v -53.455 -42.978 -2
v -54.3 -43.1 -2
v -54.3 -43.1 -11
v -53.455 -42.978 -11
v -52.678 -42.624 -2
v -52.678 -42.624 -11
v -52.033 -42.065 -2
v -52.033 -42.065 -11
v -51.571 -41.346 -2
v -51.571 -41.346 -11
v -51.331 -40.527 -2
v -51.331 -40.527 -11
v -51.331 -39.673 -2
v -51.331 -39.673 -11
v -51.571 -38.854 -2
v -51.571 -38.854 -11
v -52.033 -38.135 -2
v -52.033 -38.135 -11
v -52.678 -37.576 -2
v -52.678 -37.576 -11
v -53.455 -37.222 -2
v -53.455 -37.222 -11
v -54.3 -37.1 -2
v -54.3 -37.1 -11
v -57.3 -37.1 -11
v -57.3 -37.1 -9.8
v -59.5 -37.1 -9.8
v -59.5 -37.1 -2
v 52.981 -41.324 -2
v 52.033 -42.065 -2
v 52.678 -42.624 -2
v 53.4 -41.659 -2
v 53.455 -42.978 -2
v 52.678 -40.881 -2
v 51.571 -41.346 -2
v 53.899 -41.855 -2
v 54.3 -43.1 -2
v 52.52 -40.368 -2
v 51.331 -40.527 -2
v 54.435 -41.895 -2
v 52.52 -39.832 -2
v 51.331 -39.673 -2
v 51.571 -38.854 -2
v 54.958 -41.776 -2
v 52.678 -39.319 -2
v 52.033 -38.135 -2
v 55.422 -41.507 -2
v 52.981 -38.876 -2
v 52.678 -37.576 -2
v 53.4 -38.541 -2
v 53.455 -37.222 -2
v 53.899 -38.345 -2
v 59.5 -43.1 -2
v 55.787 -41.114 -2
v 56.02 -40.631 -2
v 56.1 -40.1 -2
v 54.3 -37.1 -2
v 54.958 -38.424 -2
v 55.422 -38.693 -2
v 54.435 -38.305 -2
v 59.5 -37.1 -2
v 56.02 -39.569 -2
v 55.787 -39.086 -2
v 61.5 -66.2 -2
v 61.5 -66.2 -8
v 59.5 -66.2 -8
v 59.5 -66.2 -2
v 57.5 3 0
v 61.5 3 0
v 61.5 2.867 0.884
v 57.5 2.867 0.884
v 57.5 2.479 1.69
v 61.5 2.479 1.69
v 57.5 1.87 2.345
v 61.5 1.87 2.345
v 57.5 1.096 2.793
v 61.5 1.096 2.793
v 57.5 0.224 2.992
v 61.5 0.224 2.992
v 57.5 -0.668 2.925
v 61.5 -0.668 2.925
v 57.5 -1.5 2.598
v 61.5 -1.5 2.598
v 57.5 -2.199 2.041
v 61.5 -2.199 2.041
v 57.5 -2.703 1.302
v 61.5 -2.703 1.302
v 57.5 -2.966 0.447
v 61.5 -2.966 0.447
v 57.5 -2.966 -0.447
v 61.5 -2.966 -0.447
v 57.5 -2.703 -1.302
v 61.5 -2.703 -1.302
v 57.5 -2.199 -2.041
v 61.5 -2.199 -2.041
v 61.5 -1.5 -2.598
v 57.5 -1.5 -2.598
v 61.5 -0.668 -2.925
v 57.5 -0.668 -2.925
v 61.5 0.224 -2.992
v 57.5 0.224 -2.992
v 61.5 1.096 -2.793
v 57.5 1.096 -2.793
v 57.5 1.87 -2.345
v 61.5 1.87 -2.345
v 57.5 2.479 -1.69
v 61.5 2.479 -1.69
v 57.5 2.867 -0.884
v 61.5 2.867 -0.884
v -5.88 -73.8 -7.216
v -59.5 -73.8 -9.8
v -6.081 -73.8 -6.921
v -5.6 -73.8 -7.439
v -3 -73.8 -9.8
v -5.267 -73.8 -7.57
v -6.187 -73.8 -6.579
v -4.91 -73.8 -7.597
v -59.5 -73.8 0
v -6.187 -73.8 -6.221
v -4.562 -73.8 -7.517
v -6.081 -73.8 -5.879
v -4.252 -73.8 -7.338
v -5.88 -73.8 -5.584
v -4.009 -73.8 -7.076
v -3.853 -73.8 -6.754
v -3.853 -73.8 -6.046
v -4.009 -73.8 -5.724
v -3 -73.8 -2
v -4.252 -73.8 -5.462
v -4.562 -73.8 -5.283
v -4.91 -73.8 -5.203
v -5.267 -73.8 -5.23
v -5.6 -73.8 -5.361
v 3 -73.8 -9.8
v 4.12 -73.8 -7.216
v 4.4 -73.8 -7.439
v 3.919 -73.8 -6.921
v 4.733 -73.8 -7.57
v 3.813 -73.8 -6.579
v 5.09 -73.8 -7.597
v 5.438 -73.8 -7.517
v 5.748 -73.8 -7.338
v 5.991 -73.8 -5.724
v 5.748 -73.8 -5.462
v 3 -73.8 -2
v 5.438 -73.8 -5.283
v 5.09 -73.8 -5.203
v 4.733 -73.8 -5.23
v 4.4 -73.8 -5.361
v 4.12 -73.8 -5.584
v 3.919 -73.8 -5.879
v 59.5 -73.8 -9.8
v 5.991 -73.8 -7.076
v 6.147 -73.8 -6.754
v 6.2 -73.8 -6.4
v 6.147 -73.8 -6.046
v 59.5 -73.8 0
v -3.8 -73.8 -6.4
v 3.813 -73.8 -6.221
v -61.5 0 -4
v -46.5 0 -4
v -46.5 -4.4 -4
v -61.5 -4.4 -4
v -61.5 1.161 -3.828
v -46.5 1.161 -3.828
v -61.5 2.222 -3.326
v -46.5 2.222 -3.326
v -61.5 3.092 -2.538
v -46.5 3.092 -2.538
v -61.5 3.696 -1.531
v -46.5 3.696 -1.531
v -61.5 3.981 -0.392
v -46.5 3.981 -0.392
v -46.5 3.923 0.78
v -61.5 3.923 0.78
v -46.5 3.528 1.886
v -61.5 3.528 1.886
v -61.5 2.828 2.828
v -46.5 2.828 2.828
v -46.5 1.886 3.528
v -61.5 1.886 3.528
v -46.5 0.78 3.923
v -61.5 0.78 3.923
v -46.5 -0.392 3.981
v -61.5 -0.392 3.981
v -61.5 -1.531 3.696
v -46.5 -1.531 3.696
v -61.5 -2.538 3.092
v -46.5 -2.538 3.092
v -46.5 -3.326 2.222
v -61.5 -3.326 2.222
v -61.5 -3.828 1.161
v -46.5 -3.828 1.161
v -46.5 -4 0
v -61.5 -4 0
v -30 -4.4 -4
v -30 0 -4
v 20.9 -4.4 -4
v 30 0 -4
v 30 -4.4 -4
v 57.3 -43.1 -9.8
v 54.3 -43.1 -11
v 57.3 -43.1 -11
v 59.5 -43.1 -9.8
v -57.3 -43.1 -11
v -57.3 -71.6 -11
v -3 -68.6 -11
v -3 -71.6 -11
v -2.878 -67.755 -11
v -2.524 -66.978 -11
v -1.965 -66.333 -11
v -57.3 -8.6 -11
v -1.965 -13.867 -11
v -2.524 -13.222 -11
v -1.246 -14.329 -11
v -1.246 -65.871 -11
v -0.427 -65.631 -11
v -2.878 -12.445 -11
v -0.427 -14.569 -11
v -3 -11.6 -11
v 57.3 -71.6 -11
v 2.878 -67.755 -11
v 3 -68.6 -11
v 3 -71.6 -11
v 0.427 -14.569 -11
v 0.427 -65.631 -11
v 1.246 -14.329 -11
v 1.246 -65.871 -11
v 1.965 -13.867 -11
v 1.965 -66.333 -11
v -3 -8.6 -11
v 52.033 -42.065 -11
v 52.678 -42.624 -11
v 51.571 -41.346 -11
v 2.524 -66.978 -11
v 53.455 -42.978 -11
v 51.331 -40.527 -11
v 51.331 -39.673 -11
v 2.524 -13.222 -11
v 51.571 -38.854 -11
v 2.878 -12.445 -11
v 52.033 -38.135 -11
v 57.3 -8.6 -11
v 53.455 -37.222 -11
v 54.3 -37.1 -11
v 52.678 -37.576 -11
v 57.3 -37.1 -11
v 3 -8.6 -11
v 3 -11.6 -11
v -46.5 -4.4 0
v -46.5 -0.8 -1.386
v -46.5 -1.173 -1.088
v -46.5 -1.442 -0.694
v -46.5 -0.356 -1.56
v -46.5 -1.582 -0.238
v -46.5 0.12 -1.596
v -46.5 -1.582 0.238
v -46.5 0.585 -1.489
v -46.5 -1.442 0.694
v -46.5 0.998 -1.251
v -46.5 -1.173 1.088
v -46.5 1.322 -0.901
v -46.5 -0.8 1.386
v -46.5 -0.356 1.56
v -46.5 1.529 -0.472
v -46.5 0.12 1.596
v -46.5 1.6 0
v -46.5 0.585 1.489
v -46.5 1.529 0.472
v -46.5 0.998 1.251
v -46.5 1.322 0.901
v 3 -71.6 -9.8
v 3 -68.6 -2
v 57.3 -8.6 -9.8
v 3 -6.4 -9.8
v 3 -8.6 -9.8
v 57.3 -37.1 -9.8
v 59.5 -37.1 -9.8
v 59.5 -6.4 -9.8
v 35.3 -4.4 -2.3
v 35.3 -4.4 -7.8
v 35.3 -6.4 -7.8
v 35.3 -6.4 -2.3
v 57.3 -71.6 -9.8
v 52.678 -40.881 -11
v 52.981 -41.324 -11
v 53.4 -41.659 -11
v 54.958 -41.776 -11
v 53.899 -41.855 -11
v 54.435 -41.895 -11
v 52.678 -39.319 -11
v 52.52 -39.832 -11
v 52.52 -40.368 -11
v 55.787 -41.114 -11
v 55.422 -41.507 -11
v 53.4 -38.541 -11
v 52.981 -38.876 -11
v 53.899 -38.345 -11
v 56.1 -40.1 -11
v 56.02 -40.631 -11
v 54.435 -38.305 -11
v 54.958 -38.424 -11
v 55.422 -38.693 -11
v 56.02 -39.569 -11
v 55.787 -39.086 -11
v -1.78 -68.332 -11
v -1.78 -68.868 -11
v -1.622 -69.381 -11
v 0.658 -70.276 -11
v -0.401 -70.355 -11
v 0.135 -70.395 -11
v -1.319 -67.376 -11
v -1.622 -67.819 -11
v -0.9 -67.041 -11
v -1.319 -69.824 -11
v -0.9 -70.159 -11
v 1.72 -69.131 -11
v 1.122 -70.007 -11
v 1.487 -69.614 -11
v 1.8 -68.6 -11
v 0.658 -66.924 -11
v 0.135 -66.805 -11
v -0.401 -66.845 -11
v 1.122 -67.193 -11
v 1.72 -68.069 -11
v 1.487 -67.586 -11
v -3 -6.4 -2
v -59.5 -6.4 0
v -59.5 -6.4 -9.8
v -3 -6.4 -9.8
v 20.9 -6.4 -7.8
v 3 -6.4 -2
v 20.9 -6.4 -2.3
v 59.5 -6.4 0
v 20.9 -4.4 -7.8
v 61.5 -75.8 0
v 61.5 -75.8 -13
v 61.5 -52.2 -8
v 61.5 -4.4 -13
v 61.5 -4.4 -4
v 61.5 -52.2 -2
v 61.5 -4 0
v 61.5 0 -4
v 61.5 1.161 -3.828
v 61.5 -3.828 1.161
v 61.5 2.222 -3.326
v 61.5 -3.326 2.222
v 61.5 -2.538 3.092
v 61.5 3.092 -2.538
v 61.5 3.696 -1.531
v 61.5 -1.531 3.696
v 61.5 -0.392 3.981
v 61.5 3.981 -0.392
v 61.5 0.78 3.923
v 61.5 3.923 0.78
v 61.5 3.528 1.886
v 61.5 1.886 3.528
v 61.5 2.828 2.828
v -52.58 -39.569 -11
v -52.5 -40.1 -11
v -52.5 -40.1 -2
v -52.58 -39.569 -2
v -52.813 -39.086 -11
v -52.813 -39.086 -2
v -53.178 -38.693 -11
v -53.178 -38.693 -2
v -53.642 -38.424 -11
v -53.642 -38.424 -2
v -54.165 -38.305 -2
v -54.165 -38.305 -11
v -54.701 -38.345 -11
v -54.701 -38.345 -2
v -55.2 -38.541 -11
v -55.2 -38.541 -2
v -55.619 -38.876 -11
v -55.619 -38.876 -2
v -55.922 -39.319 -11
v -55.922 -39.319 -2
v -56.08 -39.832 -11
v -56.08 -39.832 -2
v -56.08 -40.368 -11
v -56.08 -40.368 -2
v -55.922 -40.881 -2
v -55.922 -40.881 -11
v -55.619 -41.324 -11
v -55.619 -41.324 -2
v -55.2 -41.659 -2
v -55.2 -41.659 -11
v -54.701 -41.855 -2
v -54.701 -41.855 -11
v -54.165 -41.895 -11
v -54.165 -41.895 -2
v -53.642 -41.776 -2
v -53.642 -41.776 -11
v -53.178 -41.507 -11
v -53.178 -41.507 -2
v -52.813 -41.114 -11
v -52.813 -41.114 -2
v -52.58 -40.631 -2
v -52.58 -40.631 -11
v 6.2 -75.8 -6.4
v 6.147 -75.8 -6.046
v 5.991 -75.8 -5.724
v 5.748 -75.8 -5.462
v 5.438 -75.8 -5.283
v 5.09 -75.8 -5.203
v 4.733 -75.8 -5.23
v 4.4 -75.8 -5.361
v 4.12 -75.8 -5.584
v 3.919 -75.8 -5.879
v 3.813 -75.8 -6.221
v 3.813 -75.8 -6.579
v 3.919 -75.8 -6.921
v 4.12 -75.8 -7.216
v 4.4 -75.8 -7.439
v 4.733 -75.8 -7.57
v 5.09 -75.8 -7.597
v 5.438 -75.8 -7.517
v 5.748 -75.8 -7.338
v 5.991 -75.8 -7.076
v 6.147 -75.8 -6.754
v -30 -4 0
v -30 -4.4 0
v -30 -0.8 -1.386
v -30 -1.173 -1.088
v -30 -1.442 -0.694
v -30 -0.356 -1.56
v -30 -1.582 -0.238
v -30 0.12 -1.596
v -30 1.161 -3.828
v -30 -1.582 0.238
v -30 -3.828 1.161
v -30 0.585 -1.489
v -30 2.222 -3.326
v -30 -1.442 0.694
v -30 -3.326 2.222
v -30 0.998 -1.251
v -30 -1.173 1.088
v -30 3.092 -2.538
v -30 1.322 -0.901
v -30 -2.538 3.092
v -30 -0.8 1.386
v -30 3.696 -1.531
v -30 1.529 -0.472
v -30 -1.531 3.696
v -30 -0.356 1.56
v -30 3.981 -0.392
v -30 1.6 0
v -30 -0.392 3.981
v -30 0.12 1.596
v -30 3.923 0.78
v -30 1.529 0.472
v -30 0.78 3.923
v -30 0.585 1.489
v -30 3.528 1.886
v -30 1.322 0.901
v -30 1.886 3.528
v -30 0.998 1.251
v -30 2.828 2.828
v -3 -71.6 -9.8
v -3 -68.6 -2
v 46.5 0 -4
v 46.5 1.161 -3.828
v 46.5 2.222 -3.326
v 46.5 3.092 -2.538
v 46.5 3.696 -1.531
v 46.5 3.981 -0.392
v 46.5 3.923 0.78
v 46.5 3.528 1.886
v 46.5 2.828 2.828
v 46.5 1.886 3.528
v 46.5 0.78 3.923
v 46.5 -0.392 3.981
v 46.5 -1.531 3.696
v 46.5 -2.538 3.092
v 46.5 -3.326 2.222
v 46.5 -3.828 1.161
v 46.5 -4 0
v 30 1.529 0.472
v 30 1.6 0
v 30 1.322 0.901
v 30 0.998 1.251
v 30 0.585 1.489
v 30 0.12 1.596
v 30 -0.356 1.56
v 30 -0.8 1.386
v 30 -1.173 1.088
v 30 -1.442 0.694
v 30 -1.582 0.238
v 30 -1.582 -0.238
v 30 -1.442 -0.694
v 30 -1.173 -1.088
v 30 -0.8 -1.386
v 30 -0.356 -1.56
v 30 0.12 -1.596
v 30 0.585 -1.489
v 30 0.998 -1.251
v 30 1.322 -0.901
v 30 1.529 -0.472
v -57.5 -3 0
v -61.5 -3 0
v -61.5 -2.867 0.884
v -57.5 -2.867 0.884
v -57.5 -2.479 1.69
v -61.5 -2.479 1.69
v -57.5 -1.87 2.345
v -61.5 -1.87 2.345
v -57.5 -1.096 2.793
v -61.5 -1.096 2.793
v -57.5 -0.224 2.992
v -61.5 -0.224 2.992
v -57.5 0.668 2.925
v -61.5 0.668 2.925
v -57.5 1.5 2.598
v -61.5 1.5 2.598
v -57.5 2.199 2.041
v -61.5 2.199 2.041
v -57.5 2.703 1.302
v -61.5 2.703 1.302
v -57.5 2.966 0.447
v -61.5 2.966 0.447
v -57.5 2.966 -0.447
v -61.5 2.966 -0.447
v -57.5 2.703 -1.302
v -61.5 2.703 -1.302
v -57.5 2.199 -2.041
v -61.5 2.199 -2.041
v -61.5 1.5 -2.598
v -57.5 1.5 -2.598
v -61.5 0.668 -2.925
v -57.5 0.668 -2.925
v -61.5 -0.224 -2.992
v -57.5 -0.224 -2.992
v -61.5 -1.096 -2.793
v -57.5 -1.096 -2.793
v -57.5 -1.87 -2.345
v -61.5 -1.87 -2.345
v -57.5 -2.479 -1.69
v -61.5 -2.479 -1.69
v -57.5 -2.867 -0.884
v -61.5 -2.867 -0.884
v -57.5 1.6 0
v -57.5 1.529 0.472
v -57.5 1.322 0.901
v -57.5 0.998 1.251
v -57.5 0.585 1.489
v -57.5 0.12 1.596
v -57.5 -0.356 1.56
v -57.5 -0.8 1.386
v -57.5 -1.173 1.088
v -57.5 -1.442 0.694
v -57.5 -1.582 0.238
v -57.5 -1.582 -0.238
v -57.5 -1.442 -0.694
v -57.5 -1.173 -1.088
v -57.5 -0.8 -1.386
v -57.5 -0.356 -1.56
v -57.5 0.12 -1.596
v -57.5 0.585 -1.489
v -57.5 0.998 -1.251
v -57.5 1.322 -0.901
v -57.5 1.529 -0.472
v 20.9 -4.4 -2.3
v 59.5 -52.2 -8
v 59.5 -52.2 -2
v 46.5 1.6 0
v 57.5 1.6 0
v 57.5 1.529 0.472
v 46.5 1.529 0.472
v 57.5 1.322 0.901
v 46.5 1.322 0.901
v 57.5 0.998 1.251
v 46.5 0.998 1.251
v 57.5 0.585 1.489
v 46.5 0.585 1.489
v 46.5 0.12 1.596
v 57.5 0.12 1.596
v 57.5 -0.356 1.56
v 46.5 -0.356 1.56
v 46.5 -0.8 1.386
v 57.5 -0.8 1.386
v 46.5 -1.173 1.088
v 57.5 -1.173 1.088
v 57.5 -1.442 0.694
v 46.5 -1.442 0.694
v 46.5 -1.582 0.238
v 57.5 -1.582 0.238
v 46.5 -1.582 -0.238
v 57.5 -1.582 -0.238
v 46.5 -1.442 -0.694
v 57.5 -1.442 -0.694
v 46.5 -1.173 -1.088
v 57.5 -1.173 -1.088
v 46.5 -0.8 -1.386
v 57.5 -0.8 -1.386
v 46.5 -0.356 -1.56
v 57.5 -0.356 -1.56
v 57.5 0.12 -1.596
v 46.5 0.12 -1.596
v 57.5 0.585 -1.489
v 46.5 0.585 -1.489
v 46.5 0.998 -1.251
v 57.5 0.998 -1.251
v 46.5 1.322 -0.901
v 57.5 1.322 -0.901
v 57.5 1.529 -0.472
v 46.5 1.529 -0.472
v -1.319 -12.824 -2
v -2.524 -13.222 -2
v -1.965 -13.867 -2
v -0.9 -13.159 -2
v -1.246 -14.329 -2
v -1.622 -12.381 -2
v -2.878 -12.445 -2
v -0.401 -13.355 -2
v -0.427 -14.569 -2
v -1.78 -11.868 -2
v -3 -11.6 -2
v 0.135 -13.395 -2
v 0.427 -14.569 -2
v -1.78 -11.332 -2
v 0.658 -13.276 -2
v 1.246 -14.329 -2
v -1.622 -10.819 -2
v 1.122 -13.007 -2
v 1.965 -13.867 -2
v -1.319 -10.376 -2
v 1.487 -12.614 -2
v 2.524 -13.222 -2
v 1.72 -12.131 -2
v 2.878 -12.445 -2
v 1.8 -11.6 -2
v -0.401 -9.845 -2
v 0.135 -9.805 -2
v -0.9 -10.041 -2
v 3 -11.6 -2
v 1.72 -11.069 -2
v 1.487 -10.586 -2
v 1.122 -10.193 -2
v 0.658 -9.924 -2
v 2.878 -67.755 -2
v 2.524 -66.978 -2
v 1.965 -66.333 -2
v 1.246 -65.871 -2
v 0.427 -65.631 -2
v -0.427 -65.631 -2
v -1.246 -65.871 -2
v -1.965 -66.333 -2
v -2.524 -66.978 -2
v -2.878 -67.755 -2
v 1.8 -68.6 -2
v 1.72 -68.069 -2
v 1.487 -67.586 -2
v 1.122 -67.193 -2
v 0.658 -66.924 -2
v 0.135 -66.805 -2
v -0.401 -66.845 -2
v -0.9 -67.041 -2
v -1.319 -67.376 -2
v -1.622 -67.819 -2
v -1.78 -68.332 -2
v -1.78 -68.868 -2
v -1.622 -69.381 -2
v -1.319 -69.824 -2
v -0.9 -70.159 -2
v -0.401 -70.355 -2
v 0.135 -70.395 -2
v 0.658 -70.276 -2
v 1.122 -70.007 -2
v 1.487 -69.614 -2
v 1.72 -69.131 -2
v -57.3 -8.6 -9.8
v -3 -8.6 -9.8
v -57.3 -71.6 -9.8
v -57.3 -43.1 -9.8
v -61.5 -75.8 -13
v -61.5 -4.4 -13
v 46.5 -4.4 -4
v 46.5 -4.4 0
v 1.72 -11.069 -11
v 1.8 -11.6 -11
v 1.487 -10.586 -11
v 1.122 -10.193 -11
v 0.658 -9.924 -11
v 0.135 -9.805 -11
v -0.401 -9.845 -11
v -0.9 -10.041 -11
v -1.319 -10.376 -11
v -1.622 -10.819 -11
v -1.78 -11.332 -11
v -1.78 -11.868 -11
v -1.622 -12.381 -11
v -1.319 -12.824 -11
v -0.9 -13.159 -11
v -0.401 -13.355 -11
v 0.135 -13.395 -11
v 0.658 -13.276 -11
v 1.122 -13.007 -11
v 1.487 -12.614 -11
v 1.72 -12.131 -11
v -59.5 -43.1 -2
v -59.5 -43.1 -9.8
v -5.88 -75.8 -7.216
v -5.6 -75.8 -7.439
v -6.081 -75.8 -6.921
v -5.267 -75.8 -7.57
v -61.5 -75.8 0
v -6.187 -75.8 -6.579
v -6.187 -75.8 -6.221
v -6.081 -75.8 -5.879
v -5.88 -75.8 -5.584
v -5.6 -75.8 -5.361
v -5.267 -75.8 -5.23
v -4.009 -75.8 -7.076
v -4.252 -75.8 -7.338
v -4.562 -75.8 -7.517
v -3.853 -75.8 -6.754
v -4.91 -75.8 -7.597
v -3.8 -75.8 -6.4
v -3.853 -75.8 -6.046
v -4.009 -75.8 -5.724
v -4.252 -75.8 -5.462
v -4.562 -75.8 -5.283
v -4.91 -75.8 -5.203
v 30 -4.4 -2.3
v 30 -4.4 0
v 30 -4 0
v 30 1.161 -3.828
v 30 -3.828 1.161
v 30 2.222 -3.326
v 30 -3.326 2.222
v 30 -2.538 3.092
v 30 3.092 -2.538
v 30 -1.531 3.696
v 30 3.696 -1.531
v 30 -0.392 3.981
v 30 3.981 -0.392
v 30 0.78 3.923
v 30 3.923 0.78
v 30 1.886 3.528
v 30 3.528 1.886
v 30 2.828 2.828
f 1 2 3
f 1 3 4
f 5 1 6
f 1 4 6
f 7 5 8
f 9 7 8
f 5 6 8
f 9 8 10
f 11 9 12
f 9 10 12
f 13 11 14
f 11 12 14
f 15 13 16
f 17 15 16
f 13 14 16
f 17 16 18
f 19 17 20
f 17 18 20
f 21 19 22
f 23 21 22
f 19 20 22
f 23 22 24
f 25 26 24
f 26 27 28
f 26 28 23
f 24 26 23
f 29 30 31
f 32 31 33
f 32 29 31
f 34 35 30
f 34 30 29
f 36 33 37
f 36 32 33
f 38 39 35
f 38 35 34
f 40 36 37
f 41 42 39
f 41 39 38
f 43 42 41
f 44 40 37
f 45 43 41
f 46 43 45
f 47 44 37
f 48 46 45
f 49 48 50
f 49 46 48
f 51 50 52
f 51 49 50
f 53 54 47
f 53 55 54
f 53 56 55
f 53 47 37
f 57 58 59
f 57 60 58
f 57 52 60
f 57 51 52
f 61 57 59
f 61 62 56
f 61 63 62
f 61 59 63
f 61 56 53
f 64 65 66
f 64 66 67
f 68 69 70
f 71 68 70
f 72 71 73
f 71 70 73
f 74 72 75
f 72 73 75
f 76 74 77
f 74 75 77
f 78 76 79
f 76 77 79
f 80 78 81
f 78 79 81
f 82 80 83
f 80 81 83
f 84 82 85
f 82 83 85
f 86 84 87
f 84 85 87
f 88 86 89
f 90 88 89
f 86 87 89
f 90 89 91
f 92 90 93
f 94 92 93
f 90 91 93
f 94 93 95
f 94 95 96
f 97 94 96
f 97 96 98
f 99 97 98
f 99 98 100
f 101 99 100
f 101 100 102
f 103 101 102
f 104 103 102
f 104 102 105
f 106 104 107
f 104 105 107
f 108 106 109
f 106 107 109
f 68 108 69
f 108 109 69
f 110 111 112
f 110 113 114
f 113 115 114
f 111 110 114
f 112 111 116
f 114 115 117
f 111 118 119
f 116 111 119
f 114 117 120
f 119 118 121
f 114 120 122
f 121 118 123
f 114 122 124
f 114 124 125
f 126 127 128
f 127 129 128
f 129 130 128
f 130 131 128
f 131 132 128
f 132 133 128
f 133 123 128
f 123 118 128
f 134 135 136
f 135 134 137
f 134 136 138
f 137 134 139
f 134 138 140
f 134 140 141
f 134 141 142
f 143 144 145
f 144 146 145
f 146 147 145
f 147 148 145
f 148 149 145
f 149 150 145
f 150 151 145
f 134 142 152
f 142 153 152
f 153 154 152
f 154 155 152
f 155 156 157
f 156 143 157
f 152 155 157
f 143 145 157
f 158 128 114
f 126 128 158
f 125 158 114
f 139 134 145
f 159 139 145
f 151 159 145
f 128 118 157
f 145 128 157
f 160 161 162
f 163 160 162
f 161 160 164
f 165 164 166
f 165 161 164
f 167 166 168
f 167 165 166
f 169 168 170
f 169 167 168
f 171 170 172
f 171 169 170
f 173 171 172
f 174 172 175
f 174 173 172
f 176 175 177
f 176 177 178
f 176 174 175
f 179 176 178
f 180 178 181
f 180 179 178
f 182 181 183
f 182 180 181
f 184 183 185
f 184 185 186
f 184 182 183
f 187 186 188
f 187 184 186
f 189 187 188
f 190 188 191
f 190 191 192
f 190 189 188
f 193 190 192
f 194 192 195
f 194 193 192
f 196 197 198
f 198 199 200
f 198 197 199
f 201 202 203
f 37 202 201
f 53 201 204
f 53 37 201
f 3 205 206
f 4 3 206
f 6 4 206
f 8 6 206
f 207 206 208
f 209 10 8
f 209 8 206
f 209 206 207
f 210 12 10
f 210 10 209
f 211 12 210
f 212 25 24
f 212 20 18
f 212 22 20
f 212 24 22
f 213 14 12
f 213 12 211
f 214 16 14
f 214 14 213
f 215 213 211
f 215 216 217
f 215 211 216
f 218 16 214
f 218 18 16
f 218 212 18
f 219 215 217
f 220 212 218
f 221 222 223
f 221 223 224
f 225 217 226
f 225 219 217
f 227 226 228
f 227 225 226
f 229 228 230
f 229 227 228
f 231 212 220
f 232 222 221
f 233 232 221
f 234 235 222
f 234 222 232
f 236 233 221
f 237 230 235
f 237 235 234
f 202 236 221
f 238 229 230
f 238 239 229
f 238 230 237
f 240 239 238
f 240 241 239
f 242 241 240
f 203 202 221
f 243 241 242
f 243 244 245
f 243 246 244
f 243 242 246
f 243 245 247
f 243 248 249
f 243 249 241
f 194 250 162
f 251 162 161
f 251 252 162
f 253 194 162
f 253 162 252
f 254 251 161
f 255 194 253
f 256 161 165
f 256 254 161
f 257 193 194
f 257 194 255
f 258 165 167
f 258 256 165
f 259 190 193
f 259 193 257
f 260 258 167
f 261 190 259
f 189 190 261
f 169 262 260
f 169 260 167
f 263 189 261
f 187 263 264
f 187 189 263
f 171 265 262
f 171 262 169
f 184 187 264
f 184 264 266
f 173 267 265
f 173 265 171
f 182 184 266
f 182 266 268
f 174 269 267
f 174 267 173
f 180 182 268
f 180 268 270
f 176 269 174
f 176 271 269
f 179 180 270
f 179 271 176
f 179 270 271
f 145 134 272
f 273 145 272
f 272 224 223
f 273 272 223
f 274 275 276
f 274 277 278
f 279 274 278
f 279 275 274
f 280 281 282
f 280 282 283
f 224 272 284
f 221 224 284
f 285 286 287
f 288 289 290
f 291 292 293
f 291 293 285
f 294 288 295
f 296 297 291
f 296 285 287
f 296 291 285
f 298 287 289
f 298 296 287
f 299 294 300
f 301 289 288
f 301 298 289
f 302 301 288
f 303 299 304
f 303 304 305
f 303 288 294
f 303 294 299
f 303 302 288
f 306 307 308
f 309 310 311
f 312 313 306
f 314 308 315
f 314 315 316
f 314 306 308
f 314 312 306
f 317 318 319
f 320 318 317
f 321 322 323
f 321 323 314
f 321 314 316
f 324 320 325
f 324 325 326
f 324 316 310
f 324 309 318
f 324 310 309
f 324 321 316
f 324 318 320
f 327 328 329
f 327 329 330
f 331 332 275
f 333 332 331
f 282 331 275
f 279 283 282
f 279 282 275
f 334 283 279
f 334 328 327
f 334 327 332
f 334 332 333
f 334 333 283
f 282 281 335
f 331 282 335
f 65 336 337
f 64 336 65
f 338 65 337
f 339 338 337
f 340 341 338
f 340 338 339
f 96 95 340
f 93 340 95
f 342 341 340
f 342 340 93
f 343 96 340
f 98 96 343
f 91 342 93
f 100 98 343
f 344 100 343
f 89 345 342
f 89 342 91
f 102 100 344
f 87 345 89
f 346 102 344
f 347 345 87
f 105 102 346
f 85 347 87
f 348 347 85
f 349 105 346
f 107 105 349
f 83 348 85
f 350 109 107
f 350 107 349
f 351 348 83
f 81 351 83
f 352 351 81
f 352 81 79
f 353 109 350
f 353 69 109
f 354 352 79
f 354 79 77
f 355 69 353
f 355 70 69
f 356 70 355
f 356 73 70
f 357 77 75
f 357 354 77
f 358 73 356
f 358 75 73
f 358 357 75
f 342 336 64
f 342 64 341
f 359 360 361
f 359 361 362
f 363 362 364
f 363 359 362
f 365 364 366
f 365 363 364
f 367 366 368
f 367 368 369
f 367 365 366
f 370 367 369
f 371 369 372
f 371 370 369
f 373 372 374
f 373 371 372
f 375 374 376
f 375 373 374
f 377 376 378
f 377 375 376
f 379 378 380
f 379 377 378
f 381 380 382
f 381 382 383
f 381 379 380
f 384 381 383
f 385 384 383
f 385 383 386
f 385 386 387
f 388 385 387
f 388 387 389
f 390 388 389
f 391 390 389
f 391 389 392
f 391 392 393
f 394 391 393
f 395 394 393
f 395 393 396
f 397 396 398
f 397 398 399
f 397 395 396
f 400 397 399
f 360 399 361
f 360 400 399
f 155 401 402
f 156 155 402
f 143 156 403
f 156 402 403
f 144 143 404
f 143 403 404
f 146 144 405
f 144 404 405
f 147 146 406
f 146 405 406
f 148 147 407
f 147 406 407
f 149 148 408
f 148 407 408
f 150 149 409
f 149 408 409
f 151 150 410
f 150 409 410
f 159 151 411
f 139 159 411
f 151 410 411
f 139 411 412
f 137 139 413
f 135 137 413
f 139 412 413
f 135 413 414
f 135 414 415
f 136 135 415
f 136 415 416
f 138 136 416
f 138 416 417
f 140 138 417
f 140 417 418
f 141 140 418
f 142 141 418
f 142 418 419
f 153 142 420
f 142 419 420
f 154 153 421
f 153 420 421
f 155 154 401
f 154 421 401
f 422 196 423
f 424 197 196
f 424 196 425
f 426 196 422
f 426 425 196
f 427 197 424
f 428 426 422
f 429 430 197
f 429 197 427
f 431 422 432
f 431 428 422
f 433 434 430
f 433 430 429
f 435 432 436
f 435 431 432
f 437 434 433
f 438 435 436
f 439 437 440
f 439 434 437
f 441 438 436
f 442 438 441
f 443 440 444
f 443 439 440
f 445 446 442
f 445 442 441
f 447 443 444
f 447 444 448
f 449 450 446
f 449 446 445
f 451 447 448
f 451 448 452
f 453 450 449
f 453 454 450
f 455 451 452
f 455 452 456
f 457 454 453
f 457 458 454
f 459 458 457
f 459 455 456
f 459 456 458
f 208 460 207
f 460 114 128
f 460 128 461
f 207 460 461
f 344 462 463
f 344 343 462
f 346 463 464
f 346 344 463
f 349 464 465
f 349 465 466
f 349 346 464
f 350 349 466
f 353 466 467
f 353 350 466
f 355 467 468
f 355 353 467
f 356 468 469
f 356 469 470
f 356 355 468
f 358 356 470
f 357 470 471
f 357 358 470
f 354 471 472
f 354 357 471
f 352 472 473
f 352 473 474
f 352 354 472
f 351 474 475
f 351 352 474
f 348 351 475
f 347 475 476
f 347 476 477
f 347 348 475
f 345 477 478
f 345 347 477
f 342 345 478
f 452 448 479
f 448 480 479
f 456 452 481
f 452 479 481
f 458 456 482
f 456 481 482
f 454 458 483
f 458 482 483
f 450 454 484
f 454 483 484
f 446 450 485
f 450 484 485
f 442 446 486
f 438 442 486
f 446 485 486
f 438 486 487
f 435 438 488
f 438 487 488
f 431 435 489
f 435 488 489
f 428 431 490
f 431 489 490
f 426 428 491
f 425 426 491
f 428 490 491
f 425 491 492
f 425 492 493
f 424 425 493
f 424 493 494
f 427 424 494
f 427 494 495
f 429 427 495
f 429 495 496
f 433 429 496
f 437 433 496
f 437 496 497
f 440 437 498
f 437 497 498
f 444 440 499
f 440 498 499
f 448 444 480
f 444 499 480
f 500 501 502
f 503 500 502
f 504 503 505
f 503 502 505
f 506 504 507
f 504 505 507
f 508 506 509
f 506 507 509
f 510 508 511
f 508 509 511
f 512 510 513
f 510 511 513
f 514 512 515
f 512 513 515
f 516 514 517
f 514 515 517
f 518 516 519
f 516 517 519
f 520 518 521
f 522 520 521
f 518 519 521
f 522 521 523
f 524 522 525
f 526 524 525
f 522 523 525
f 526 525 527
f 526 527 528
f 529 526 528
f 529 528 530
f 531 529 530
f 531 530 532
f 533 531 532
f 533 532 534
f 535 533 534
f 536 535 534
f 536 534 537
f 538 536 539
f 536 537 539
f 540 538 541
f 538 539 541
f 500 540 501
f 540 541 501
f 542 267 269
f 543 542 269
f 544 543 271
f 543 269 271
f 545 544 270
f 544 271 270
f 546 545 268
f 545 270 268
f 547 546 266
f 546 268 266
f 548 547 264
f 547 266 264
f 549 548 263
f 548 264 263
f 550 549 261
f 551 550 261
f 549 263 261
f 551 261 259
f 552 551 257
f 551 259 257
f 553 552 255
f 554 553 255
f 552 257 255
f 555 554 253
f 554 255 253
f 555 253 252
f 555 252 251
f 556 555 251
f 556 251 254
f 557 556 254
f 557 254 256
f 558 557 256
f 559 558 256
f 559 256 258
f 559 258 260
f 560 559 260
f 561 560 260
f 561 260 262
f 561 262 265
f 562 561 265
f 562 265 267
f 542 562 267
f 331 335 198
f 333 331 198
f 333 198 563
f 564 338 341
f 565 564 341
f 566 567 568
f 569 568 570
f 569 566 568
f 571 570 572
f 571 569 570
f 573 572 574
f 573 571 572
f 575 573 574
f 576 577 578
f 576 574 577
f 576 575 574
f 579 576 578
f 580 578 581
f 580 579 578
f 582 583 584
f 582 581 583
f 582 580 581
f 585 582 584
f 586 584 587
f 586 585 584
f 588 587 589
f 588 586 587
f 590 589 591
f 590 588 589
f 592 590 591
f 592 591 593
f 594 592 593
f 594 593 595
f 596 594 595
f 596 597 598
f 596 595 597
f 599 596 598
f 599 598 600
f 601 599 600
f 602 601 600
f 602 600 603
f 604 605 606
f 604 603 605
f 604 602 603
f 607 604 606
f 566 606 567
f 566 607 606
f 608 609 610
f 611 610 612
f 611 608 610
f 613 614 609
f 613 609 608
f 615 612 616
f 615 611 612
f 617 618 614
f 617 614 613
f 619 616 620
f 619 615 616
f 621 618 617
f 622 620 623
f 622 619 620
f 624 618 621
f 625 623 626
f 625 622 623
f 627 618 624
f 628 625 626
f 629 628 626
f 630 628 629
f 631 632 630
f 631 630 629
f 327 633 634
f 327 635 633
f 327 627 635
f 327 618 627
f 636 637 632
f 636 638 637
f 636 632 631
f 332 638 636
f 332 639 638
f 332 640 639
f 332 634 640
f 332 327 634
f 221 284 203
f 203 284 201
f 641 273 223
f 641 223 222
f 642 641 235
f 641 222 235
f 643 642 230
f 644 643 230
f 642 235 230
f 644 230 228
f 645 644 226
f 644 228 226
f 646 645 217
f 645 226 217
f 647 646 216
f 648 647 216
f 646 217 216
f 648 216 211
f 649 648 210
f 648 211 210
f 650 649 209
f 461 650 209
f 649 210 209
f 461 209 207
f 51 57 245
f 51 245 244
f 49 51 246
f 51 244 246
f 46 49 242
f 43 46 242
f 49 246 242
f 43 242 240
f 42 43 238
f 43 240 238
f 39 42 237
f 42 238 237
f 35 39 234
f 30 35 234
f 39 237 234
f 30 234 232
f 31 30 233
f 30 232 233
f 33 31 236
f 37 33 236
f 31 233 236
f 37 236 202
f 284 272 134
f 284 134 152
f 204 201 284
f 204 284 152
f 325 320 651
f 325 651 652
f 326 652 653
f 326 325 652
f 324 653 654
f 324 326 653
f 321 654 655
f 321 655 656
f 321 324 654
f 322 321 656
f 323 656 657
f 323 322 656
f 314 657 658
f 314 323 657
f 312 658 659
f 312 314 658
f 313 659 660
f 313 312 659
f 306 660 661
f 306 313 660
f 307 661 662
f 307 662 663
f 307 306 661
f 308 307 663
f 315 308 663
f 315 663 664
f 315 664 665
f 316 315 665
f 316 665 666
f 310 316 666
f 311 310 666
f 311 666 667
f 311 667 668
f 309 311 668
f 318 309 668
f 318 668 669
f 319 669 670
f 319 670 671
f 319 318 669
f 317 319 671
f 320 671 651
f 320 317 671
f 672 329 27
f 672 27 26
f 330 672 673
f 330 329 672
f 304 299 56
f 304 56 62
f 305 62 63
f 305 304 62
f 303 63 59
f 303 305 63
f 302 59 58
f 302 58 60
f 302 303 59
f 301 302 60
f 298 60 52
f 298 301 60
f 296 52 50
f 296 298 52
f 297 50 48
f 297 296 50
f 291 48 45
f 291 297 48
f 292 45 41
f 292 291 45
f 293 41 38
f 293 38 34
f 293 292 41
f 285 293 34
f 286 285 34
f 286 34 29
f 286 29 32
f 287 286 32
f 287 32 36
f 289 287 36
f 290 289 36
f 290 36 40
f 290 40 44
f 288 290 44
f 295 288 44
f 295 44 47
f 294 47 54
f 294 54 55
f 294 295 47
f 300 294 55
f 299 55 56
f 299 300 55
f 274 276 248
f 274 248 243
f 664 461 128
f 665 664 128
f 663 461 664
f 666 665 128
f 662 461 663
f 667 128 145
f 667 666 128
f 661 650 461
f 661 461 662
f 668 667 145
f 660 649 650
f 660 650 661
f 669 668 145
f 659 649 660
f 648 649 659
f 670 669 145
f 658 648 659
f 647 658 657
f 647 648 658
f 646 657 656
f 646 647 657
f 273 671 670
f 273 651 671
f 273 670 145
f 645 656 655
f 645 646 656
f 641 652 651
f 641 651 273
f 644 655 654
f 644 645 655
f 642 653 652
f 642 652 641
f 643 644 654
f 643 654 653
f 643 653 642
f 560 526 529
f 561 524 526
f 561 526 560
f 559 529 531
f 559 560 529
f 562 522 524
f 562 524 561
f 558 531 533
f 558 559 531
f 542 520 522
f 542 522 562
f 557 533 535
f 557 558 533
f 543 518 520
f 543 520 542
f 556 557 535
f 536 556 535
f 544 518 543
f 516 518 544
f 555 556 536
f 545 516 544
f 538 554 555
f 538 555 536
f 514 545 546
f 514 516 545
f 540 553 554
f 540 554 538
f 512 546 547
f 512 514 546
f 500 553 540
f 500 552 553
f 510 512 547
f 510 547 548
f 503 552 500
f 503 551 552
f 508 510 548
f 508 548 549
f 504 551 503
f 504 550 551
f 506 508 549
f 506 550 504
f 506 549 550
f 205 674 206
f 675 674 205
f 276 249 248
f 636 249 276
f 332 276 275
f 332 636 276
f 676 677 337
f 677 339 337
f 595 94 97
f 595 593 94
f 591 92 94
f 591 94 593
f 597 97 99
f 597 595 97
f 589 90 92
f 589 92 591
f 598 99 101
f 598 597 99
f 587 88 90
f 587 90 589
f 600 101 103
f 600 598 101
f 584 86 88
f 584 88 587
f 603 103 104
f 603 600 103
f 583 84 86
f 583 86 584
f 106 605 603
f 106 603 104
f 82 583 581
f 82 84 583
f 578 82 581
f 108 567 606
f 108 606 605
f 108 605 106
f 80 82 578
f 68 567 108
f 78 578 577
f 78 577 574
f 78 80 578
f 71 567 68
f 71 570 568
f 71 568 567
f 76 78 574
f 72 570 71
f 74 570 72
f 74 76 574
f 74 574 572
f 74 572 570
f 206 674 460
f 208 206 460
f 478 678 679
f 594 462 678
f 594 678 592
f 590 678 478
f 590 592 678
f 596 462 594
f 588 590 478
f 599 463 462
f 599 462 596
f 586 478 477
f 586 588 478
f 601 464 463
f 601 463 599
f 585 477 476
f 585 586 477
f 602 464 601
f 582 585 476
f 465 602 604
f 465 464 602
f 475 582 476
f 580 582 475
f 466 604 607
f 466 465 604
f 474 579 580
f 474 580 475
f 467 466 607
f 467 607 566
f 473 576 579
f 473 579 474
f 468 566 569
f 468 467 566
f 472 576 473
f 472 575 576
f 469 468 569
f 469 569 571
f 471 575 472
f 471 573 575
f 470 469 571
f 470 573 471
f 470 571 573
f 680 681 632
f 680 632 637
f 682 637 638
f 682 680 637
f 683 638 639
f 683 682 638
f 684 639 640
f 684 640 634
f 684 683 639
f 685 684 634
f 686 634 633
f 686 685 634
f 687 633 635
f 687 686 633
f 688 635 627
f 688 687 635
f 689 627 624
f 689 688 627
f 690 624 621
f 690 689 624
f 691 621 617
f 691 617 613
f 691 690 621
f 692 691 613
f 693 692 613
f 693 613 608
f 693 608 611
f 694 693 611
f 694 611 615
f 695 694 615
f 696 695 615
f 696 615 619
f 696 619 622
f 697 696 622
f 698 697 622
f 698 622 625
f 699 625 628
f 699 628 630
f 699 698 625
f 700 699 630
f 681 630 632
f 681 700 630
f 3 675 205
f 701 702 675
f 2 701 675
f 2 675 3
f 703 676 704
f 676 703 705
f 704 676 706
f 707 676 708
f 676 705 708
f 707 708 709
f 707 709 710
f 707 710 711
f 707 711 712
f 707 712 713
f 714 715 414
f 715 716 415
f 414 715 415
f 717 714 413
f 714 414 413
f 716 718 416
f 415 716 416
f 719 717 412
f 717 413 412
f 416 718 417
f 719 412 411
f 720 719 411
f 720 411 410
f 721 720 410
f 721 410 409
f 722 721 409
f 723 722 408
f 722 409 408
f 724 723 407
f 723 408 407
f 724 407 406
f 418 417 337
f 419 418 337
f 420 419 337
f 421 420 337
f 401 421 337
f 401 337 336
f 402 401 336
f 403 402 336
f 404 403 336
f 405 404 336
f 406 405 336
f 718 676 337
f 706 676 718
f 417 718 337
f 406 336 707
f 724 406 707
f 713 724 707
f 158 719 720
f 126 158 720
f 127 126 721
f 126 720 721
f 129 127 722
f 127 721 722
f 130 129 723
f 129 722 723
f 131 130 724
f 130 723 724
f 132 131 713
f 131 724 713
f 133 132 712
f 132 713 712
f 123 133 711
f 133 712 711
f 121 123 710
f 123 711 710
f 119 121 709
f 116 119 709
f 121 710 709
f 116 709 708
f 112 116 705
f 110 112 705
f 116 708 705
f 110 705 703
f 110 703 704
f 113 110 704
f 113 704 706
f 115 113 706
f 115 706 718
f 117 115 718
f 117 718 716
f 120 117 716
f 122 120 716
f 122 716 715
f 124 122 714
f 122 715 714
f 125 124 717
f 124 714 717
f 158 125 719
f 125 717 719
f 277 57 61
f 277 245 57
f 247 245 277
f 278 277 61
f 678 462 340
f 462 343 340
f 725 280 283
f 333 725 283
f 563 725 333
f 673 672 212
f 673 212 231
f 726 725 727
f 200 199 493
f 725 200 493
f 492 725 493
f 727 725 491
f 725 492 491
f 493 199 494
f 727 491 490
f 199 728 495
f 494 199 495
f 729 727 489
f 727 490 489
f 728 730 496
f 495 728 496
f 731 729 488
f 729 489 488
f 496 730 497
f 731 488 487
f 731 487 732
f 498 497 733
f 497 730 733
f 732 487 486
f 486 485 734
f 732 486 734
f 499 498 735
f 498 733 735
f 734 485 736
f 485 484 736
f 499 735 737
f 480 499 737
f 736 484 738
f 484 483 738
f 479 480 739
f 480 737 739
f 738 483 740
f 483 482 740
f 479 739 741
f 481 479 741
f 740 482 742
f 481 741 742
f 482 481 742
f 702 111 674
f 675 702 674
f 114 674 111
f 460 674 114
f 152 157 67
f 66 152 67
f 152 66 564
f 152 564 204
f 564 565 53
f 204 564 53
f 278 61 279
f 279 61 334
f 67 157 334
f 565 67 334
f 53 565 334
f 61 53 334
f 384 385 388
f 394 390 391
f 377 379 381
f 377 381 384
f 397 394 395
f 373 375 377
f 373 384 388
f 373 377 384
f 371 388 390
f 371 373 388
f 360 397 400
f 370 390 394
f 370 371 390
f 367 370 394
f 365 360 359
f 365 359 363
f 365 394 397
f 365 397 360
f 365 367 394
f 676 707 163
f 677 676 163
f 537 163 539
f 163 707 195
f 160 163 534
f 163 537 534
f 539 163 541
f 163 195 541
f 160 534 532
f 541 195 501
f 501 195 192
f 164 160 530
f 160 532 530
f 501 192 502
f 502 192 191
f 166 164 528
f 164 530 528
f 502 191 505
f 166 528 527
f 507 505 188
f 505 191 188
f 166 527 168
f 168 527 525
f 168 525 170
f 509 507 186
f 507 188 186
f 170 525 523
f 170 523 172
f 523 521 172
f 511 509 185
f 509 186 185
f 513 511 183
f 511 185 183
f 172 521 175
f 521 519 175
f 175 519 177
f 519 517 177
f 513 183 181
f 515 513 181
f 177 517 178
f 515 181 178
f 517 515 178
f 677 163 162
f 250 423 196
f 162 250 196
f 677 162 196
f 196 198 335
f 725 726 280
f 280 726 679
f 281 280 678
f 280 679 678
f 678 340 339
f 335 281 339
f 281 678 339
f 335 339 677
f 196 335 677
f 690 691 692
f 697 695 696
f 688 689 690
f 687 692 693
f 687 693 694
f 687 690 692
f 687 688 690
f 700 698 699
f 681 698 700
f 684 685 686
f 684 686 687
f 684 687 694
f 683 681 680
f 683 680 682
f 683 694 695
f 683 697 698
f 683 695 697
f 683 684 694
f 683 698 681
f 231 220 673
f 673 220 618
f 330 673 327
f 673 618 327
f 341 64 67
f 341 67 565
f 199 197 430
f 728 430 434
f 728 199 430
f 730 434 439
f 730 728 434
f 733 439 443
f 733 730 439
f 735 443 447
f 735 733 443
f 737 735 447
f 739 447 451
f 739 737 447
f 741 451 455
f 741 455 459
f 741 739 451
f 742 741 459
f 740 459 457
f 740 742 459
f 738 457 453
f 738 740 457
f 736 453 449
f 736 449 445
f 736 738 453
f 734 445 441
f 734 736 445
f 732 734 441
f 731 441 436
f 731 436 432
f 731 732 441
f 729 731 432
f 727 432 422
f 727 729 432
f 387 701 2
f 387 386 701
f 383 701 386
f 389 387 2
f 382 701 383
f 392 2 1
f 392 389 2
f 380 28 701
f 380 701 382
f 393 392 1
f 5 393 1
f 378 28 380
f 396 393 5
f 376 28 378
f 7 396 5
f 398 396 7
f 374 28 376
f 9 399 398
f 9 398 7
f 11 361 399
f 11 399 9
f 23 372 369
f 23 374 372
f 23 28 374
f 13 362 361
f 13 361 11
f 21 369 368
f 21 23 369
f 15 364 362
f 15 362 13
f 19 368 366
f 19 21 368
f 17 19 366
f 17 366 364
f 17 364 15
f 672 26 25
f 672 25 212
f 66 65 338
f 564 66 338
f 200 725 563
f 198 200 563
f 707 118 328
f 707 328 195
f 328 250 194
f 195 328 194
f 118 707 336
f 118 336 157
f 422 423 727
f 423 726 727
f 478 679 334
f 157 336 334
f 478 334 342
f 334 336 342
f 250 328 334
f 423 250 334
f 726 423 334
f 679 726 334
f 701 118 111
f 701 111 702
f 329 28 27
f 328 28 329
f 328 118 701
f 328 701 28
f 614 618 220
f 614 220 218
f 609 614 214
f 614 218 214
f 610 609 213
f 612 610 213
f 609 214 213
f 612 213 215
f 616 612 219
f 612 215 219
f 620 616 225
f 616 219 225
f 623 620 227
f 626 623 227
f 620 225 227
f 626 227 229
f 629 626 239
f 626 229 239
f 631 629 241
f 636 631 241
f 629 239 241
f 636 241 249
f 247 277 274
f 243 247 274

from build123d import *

# Parameters (mm, degrees)
SKETCH036_R       = 1.6
PAD001_DEPTH      = 61.5
PAD001_DEPTH_BACK = 61.5
SKETCH037_W       = 16.5
SKETCH037_H       = 8
POCKET_DEPTH      = 4
POCKET_DEPTH_BACK = 4
SKETCH044_W       = 119
SKETCH044_H       = 67.4
POCKET007_DEPTH   = 2
SKETCH045_W       = 114.6
SKETCH045_H       = 63
POCKET008_DEPTH   = 9
SKETCH046_R       = 1.8
PAD002_DEPTH      = 9
SKETCH047_W       = 56.5
SKETCH047_H       = 30.7
POCKET009_DEPTH   = 7.8
SKETCH048_R       = 1.2
POCKET010_DEPTH   = 2
SKETCH052_W       = 16.5
SKETCH052_H       = 4
POCKET014_DEPTH   = 0.4
SKETCH053_W       = 14.4
SKETCH053_H       = 5.5
POCKET015_DEPTH   = 2.2
SKETCH054_W       = 14
SKETCH054_H       = 6
POCKET016_DEPTH   = 2
SKETCH055_R       = 3
POCKET017_DEPTH   = 4
SKETCH056_R       = 3
POCKET018_DEPTH   = 4


with BuildPart() as part:
    # Sketch036 (on Face1 of Binder001) → Pad001 (new body, two sides)
    with BuildSketch(Plane.YZ) as pad001_sk:
        with BuildLine():
            ThreePointArc((0, -4), (2.828427, 2.828427), (-4, 0))
            Line((-75.8, 0), (-4, 0))
            Line((-75.8, -13), (-75.8, 0))
            Line((-4.4, -13), (-75.8, -13))
            Line((-4.4, -4), (-4.4, -13))
            Line((0, -4), (-4.4, -4))
        make_face()
        Circle(SKETCH036_R, mode=Mode.SUBTRACT)
    extrude(amount=PAD001_DEPTH)
    extrude(pad001_sk.sketch, amount=-PAD001_DEPTH_BACK)

    # Sketch037 → Pocket (cut, two sides)
    with BuildSketch(Plane.XY) as pocket_sk:
        with Locations((-38.25, 0)):
            Rectangle(SKETCH037_W, SKETCH037_H)
        with Locations((38.25, 0)):
            Rectangle(SKETCH037_W, SKETCH037_H)
    extrude(amount=-POCKET_DEPTH, mode=Mode.SUBTRACT)
    extrude(pocket_sk.sketch, amount=POCKET_DEPTH_BACK, mode=Mode.SUBTRACT)

    # Sketch044 → Pocket007 (cut)
    with BuildSketch(Plane.XY):
        with Locations((0, -40.1)):
            Rectangle(SKETCH044_W, SKETCH044_H)
    extrude(amount=-POCKET007_DEPTH, mode=Mode.SUBTRACT)

    # Sketch045 (on Face23 of Pocket007) → Pocket008 (cut)
    with BuildSketch(Plane.XY.offset(-2)):
        with Locations((0, -40.1)):
            Rectangle(SKETCH045_W, SKETCH045_H)
    extrude(amount=-POCKET008_DEPTH, mode=Mode.SUBTRACT)

    # Sketch046 (on Face29 of Pocket008) → Pad002 (join)
    with BuildSketch(Plane.XY.offset(-11)):
        with BuildLine():
            ThreePointArc((-54.3, -43.1), (-51.3, -40.1), (-54.3, -37.1))
            Line((-57.3, -37.1), (-54.3, -37.1))
            Line((-57.3, -43.1), (-57.3, -37.1))
            Line((-54.3, -43.1), (-57.3, -43.1))
        make_face()
        with Locations((-54.3, -40.1)):
            Circle(SKETCH046_R, mode=Mode.SUBTRACT)
        with BuildLine():
            ThreePointArc((-3, -11.6), (0, -14.6), (3, -11.6))
            Line((3, -8.6), (3, -11.6))
            Line((-3, -8.6), (3, -8.6))
            Line((-3, -11.6), (-3, -8.6))
        make_face()
        with Locations((0, -11.6)):
            Circle(SKETCH046_R, mode=Mode.SUBTRACT)
        with BuildLine():
            ThreePointArc((54.3, -37.1), (51.3, -40.1), (54.3, -43.1))
            Line((57.3, -43.1), (54.3, -43.1))
            Line((57.3, -37.1), (57.3, -43.1))
            Line((54.3, -37.1), (57.3, -37.1))
        make_face()
        with Locations((54.3, -40.1)):
            Circle(SKETCH046_R, mode=Mode.SUBTRACT)
        with BuildLine():
            ThreePointArc((3, -68.6), (0, -65.6), (-3, -68.6))
            Line((-3, -68.6), (-3, -71.6))
            Line((-3, -71.6), (3, -71.6))
            Line((3, -71.6), (3, -68.6))
        make_face()
        with Locations((0, -68.6)):
            Circle(SKETCH046_R, mode=Mode.SUBTRACT)
    extrude(amount=PAD002_DEPTH)

    # Sketch047 (on Face24 of Pad002) → Pocket009 (cut)
    with BuildSketch(Plane.XY.offset(-2)):
        with Locations((-31.25, -21.75)):
            Rectangle(SKETCH047_W, SKETCH047_H)
        with Locations((31.25, -21.75)):
            Rectangle(SKETCH047_W, SKETCH047_H)
        with Locations((31.25, -58.45)):
            Rectangle(SKETCH047_W, SKETCH047_H)
        with Locations((-31.25, -58.45)):
            Rectangle(SKETCH047_W, SKETCH047_H)
    extrude(amount=-POCKET009_DEPTH, mode=Mode.SUBTRACT)

    # Sketch048 (on Face6 of Pocket009) → Pocket010 (cut)
    with BuildSketch(Plane.XZ.offset(75.8)):
        with Locations((-5, -6.4)):
            Circle(SKETCH048_R)
        with Locations((5, -6.4)):
            Circle(SKETCH048_R)
    extrude(amount=-POCKET010_DEPTH, mode=Mode.SUBTRACT)

    # Sketch052 (on Face13 of Pocket010) → Pocket014 (cut)
    with BuildSketch(Plane(origin=(0, -4, 0), x_dir=(-1, 0, 0), z_dir=(0, 1, 0))):
        with Locations((38.25, -2)):
            Rectangle(SKETCH052_W, SKETCH052_H)
        with Locations((-38.25, -2)):
            Rectangle(SKETCH052_W, SKETCH052_H)
    extrude(amount=-POCKET014_DEPTH, mode=Mode.SUBTRACT)

    # Sketch053 (on Face58 of Pocket014) → Pocket015 (cut)
    with BuildSketch(Plane(origin=(0, -4.4, 0), x_dir=(-1, 0, 0), z_dir=(0, 1, 0))):
        with Locations((-28.1, -5.05)):
            Rectangle(SKETCH053_W, SKETCH053_H)
    extrude(amount=-POCKET015_DEPTH, mode=Mode.SUBTRACT)

    # Sketch054 (on Face15 of Pocket015) → Pocket016 (cut)
    with BuildSketch(Plane.YZ.offset(61.5)):
        with Locations((-59.2, -5)):
            Rectangle(SKETCH054_W, SKETCH054_H)
    extrude(amount=-POCKET016_DEPTH, mode=Mode.SUBTRACT)

    # Sketch055 (on Face15 of Pocket016) → Pocket017 (cut)
    with BuildSketch(Plane.YZ.offset(61.5)):
        Circle(SKETCH055_R)
    extrude(amount=-POCKET017_DEPTH, mode=Mode.SUBTRACT)

    # Sketch056 (on Face2 of Pocket017) → Pocket018 (cut)
    with BuildSketch(Plane(origin=(-61.5, 0, 0), x_dir=(0, -1, 0), z_dir=(-1, 0, 0))):
        Circle(SKETCH056_R)
    extrude(amount=-POCKET018_DEPTH, mode=Mode.SUBTRACT)


solid = part.part
